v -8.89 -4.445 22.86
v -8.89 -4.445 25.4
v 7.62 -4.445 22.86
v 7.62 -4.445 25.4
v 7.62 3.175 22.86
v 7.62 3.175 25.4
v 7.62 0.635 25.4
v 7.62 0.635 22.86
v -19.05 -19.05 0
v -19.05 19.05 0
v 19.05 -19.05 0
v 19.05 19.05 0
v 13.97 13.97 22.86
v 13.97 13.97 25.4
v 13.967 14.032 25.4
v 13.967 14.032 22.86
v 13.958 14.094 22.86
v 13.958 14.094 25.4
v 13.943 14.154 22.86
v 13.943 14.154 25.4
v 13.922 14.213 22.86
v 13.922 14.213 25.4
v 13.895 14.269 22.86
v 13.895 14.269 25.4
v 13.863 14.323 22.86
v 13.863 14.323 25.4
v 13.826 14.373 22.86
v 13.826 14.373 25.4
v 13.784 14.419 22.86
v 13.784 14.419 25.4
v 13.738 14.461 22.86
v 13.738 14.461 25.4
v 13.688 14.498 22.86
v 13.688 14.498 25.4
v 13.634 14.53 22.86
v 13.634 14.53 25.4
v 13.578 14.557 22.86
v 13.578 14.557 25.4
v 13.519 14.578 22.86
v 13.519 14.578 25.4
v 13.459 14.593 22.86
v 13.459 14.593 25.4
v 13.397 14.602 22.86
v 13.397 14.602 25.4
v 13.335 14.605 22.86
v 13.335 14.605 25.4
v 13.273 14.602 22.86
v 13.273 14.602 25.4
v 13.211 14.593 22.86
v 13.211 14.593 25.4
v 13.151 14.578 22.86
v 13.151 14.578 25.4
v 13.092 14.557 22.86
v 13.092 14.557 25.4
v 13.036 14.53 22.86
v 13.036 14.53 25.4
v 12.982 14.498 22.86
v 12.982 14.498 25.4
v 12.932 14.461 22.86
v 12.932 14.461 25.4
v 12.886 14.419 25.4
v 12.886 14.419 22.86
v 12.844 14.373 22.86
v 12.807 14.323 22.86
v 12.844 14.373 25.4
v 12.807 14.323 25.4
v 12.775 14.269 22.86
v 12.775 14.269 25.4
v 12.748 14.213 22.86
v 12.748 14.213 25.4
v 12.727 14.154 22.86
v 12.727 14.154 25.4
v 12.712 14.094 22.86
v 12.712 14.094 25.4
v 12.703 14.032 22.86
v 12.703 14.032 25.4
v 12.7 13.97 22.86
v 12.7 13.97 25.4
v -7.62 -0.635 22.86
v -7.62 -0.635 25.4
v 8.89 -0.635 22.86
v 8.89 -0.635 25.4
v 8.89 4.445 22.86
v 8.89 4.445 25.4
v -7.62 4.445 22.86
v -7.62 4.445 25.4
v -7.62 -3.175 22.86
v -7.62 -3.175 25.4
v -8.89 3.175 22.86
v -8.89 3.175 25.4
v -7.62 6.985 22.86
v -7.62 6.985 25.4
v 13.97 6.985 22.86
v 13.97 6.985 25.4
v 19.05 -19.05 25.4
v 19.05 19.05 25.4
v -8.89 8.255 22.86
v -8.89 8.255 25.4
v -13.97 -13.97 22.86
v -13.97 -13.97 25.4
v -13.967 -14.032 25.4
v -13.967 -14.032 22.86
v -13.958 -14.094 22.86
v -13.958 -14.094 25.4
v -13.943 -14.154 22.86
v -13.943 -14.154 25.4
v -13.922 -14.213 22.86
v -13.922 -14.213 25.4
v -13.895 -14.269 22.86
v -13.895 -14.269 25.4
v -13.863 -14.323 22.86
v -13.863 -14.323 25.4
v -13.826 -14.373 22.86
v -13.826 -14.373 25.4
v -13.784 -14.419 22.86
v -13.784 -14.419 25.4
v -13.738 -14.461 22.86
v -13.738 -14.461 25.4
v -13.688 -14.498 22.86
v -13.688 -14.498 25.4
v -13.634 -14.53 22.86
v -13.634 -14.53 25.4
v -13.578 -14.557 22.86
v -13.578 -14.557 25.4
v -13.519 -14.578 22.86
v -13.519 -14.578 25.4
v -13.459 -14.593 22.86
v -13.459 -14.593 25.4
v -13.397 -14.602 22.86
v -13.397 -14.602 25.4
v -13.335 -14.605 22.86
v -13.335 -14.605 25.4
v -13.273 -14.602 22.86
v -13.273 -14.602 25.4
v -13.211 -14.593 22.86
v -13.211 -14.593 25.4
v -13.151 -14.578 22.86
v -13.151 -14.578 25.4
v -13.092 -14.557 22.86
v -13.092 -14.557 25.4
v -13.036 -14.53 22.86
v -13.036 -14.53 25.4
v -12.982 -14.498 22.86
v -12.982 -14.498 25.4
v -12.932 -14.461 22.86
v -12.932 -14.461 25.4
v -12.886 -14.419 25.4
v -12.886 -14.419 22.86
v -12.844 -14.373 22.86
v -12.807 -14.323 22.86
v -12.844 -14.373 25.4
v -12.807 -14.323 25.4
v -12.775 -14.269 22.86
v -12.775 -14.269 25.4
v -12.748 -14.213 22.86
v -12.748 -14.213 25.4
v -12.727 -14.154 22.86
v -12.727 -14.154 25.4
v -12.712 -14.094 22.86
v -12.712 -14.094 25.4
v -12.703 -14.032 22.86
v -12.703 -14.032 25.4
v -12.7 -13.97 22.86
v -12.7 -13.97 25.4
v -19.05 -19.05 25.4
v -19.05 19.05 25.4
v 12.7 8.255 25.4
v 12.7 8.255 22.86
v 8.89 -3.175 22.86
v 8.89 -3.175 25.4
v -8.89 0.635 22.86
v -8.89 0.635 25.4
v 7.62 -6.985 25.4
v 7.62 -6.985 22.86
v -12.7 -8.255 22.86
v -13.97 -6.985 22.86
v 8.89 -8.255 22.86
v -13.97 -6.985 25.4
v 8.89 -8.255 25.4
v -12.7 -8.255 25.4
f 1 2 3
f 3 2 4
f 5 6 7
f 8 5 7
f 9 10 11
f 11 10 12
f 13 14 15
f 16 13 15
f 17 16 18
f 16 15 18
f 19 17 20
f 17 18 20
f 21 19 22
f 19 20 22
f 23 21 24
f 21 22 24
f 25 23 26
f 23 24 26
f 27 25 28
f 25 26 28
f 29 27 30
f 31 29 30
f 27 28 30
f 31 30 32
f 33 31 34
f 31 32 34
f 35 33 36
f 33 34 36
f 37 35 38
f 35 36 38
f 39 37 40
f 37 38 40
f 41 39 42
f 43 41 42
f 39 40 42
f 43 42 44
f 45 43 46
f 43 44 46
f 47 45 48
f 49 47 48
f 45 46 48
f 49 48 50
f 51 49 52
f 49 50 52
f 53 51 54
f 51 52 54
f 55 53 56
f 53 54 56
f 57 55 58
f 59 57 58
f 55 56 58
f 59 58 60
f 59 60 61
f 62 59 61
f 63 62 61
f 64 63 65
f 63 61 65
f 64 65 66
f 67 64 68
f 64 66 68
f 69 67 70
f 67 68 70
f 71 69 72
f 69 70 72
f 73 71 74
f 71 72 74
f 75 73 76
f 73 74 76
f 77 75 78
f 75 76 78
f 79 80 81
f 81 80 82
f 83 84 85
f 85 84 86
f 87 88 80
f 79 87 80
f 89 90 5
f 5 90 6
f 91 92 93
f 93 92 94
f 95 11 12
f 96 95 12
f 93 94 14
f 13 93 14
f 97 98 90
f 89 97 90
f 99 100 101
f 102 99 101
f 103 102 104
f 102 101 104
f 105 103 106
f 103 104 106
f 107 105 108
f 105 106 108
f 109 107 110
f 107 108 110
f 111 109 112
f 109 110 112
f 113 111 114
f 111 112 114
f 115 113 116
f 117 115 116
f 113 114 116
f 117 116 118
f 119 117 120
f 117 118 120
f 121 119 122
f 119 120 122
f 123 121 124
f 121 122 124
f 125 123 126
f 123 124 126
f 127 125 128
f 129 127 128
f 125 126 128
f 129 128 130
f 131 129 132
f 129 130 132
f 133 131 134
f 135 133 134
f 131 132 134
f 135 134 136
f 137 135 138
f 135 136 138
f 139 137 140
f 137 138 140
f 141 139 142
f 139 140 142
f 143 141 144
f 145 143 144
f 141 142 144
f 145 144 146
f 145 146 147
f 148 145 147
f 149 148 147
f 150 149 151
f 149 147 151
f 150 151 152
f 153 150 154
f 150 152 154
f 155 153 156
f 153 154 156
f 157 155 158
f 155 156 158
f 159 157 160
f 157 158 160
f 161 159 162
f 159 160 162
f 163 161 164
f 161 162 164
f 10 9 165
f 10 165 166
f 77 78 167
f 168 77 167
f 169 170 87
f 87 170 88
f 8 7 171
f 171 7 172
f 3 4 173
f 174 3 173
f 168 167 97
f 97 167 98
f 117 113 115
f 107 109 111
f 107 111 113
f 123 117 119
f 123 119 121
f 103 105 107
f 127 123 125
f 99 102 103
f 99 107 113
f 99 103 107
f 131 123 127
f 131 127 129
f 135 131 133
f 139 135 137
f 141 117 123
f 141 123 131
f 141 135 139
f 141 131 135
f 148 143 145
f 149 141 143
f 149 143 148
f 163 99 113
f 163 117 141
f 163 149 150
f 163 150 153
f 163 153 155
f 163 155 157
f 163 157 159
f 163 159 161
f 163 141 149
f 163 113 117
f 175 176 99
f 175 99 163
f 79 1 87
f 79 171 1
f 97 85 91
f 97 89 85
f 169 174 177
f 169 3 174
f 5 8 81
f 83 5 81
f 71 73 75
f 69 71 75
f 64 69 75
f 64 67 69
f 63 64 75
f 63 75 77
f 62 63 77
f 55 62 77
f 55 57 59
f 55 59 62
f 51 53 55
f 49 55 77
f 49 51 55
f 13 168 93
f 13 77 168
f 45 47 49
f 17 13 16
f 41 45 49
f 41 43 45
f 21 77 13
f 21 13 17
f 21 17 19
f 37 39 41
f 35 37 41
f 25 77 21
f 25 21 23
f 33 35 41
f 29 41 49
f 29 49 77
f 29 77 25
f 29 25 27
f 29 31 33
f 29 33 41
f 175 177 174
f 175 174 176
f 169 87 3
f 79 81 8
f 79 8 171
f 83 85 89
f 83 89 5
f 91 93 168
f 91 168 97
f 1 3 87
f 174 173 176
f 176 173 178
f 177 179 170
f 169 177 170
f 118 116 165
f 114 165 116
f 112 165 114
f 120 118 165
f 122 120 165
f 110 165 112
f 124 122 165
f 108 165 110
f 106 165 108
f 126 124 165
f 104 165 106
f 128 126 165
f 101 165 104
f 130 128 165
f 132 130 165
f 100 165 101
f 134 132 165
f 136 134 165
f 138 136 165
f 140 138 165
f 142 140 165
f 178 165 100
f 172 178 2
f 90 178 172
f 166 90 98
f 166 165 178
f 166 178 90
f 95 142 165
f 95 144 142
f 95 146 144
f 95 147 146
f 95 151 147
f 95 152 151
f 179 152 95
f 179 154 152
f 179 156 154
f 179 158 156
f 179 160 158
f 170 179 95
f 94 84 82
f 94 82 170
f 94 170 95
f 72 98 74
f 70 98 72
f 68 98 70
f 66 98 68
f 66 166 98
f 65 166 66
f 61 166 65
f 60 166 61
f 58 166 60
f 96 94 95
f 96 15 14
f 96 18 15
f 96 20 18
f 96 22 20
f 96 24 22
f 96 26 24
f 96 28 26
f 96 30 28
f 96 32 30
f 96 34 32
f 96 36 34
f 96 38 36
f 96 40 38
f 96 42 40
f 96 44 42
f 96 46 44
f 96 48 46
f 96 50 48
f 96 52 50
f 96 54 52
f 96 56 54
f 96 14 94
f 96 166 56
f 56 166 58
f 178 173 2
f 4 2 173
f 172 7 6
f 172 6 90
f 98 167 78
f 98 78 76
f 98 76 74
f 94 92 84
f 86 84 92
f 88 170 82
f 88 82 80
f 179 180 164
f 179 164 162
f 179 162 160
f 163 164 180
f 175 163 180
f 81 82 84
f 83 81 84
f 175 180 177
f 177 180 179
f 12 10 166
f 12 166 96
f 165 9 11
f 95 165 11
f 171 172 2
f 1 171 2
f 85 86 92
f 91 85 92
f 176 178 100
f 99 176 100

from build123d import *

# Parameters (mm, degrees)
F0_W     = 38.1
F0_H     = 38.1
F1_DEPTH = 25.4
F3_DEPTH = 2.54


with BuildPart() as f1:
    # F0 (on Top) → F1 (new body)
    with BuildSketch(Plane.XY):
        Rectangle(F0_W, F0_H)
    extrude(amount=F1_DEPTH)

    # F2 (on face) → F3 (cut)
    with BuildSketch(Plane.XY.offset(25.4)):
        with BuildLine():
            Line((-13.97, -6.985), (-13.97, -13.97))
            ThreePointArc((-13.97, -13.97), (-13.335, -14.605), (-12.7, -13.97))
            Line((-12.7, -13.97), (-12.7, -8.255))
            Line((-12.7, -8.255), (8.89, -8.255))
            Line((8.89, -8.255), (8.89, -3.175))
            Line((8.89, -3.175), (-7.62, -3.175))
            Line((-7.62, -3.175), (-7.62, -0.635))
            Line((-7.62, -0.635), (8.89, -0.635))
            Line((8.89, -0.635), (8.89, 4.445))
            Line((8.89, 4.445), (-7.62, 4.445))
            Line((-7.62, 4.445), (-7.62, 6.985))
            Line((-7.62, 6.985), (13.97, 6.985))
            Line((13.97, 6.985), (13.97, 13.97))
            ThreePointArc((13.97, 13.97), (13.335, 14.605), (12.7, 13.97))
            Line((12.7, 13.97), (12.7, 8.255))
            Line((12.7, 8.255), (-8.89, 8.255))
            Line((-8.89, 8.255), (-8.89, 3.175))
            Line((-8.89, 3.175), (7.62, 3.175))
            Line((7.62, 3.175), (7.62, 0.635))
            Line((7.62, 0.635), (-8.89, 0.635))
            Line((-8.89, 0.635), (-8.89, -4.445))
            Line((-8.89, -4.445), (7.62, -4.445))
            Line((7.62, -4.445), (7.62, -6.985))
            Line((7.62, -6.985), (-13.97, -6.985))
        make_face()
    extrude(amount=-F3_DEPTH, mode=Mode.SUBTRACT)


solid = f1.part
